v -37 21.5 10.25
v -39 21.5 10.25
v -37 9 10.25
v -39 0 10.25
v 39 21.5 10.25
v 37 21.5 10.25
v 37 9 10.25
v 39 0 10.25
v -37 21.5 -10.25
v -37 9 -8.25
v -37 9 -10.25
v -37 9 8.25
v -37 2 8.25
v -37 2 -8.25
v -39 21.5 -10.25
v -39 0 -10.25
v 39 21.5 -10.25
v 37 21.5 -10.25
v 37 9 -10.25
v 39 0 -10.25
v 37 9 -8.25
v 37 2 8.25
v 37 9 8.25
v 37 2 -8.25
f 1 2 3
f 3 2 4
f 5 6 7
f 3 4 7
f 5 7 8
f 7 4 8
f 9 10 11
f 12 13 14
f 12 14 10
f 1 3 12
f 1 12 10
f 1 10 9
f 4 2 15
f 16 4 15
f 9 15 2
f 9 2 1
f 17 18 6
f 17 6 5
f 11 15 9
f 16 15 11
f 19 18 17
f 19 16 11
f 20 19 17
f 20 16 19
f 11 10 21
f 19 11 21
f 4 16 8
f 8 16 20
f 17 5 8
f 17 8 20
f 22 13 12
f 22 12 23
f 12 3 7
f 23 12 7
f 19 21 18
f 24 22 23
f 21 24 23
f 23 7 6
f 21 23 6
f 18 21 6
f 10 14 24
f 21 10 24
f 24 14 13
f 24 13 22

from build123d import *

# Parameters (mm, degrees)
CROQUIS1_W              = 78
CROQUIS1_H              = 20.5
SALIENTE_EXTRUIR1_DEPTH = 21.5
VACIADO1_T              = -2
CROQUIS2_W              = 74
CROQUIS2_H              = 12.5
CORTAR_EXTRUIR1_DEPTH   = 41.5


with BuildPart() as part:
    # Croquis1 → Saliente-Extruir1 (new body)
    with BuildSketch(Plane(origin=(0, 0, 0), x_dir=(1, 0, 0), z_dir=(0, 1, 0))):
        Rectangle(CROQUIS1_W, CROQUIS1_H)
    extrude(amount=SALIENTE_EXTRUIR1_DEPTH)

    # Vaciado1
    vaciado1_openings = [part.faces().sort_by_distance(p)[0] for p in [
        (0, 21.5, 0),
    ]]
    offset(amount=VACIADO1_T, openings=vaciado1_openings, kind=Kind.INTERSECTION)

    # Croquis2 → Cortar-Extruir1 (cut)
    with BuildSketch(Plane.XY.offset(10.25)):
        with Locations((0, 15.25)):
            Rectangle(CROQUIS2_W, CROQUIS2_H)
    extrude(amount=-CORTAR_EXTRUIR1_DEPTH, mode=Mode.SUBTRACT)


solid = part.part
